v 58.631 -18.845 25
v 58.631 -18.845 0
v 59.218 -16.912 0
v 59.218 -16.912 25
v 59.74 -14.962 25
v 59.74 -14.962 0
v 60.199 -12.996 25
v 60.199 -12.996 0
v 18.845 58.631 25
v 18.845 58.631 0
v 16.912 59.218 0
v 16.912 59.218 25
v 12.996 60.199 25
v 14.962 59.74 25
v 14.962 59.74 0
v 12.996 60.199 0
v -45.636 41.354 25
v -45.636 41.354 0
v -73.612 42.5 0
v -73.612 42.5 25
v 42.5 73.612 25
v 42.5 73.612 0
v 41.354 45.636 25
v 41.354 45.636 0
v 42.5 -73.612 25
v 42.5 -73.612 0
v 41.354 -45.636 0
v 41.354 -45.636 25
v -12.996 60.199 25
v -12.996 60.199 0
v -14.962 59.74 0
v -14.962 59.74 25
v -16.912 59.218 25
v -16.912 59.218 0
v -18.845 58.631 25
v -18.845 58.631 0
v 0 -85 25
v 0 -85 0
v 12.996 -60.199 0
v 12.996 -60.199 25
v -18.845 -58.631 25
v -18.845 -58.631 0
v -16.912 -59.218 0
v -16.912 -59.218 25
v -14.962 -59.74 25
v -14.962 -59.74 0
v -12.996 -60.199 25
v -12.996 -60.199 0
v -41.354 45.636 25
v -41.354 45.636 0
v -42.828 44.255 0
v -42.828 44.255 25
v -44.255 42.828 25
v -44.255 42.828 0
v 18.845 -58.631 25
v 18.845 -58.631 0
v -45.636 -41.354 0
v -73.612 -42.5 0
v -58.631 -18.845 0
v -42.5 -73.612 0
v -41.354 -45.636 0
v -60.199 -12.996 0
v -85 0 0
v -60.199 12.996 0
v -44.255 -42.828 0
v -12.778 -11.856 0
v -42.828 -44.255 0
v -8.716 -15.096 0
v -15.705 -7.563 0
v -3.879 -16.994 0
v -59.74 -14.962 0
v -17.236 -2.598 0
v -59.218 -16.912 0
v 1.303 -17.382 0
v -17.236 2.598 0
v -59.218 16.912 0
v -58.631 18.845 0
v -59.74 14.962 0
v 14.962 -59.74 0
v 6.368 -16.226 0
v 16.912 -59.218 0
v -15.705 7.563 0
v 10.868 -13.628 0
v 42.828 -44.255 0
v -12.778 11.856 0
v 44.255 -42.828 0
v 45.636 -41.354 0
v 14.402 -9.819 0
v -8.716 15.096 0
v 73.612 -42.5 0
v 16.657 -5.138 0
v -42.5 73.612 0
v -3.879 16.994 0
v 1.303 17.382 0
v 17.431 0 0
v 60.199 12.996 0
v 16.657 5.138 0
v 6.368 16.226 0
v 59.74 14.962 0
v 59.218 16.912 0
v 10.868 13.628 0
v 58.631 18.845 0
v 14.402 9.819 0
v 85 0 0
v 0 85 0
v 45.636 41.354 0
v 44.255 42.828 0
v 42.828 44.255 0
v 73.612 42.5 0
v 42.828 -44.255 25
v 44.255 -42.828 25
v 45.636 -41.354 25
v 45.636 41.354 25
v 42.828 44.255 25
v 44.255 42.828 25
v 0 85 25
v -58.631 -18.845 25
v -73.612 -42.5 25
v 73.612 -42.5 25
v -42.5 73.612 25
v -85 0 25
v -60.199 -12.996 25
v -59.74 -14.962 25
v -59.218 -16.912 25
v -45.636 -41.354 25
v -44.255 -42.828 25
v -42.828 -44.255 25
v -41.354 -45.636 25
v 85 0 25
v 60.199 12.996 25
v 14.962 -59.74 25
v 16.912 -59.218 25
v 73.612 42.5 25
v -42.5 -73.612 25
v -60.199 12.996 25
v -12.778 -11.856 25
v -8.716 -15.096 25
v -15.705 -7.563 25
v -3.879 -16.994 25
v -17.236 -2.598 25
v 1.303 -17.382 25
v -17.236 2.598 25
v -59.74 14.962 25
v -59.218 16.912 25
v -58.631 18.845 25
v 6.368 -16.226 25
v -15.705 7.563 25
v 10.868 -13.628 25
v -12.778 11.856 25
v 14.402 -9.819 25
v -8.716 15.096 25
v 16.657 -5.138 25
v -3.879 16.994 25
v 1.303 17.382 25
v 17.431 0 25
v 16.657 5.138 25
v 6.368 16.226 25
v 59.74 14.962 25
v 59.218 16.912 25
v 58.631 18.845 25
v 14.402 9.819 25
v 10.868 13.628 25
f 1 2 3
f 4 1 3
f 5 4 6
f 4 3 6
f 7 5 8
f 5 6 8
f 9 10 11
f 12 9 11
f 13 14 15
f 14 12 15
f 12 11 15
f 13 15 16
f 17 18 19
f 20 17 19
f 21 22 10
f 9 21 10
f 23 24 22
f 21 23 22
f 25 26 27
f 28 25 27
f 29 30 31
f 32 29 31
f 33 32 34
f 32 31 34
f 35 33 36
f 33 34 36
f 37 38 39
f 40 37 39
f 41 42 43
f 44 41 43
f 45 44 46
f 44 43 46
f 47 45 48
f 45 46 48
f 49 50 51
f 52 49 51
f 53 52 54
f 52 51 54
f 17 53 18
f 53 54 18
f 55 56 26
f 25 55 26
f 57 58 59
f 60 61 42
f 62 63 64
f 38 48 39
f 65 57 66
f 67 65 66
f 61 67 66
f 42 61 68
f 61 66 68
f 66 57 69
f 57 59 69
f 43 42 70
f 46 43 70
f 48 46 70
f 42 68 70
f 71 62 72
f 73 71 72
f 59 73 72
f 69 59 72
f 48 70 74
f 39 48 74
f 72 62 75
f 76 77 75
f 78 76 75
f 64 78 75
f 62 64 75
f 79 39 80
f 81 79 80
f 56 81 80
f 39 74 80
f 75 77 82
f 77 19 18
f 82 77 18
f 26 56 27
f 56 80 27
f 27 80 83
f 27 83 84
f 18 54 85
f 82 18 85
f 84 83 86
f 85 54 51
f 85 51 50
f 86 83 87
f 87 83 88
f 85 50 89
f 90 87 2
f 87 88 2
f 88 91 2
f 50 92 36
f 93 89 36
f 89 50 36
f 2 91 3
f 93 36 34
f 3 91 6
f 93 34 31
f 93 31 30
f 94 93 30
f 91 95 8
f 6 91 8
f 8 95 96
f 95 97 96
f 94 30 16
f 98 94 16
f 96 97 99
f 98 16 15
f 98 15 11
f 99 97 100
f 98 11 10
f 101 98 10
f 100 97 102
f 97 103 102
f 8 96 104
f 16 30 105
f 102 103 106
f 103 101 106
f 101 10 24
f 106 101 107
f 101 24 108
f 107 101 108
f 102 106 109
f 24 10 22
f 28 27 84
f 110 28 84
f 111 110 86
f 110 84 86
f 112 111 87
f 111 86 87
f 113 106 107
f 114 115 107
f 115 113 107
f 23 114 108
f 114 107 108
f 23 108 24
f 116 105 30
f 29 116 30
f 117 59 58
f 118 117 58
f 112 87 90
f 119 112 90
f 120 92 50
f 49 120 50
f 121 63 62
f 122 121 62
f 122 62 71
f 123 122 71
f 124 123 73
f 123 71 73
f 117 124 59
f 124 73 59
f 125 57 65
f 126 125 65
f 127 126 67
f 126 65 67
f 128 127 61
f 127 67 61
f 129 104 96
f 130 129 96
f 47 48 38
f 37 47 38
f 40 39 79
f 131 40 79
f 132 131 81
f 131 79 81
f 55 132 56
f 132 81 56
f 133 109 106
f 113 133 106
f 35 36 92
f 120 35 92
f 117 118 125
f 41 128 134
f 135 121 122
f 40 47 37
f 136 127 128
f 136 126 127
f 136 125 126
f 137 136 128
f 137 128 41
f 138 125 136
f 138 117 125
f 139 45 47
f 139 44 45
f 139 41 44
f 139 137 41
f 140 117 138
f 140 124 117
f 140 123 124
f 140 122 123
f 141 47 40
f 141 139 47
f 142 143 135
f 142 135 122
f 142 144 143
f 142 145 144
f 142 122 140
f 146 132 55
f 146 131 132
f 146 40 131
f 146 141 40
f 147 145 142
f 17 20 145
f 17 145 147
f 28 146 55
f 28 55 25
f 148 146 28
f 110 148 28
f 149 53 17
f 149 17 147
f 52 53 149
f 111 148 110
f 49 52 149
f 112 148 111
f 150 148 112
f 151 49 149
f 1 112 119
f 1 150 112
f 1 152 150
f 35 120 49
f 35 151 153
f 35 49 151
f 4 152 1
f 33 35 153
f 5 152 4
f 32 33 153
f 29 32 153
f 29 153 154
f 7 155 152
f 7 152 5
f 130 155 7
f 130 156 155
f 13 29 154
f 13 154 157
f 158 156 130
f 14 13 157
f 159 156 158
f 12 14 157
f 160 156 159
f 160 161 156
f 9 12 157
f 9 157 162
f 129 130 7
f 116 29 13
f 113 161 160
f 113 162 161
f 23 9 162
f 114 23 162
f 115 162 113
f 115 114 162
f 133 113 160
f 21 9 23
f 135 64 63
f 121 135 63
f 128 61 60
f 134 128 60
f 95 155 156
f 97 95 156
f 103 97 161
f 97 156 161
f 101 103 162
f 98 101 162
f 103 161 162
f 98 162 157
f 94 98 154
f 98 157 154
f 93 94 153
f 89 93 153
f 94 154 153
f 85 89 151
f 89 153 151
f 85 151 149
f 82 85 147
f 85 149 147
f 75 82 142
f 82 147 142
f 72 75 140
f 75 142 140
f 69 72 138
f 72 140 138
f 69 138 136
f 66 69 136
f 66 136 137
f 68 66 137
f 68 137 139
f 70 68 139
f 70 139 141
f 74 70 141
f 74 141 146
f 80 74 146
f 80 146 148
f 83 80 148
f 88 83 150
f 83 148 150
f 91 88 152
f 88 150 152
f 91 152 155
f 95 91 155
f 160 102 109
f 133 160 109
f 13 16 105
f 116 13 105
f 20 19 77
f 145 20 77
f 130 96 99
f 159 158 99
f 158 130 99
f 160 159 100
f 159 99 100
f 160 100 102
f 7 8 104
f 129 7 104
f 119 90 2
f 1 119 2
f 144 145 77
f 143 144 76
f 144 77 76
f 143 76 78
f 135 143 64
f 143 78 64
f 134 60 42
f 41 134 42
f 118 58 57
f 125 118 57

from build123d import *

# Parameters (mm, degrees)
F0_R            = 61.5853666469
F1_DEPTH        = 25
F2_R            = 17.4311755098
F3_DEPTH        = 25
F5_DEPTH        = 25
F5_COPIES_COUNT = 12


# Not quite as in the source:
# - a pattern or mirror of a feature is missing from the dataset's text; its kind, count and spacing are read off the source's solid


with BuildPart() as f1:
    # F0 (on Top) → F1 (new body)
    with BuildSketch(Plane.XY):
        Circle(F0_R)
    extrude(amount=F1_DEPTH)

    # F2 (on face) → F3 (cut)
    with BuildSketch(Plane.XY.offset(25)):
        Circle(F2_R)
    extrude(amount=-F3_DEPTH, mode=Mode.SUBTRACT)

    # F4 (on Top) → F5 (join)
    with BuildSketch(Plane.XY):
        with BuildLine():
            Line((0, 85), (-12.9957382045, 60.1985728532))
            ThreePointArc((-12.9957382045, 60.1985728532), (0, 61.5853666469), (12.9957382045, 60.1985728532))
            Line((12.9957382045, 60.1985728532), (0, 85))
        make_face()
    f5 = extrude(amount=F5_DEPTH)

    # F5_copies: F5 ×12 about axis
    f5_copies_axis = Axis((0, 0, 0), (0, 0, 1))
    for i in range(1, F5_COPIES_COUNT):
        add(f5.rotate(f5_copies_axis, i * 360 / F5_COPIES_COUNT))


solid = f1.part
